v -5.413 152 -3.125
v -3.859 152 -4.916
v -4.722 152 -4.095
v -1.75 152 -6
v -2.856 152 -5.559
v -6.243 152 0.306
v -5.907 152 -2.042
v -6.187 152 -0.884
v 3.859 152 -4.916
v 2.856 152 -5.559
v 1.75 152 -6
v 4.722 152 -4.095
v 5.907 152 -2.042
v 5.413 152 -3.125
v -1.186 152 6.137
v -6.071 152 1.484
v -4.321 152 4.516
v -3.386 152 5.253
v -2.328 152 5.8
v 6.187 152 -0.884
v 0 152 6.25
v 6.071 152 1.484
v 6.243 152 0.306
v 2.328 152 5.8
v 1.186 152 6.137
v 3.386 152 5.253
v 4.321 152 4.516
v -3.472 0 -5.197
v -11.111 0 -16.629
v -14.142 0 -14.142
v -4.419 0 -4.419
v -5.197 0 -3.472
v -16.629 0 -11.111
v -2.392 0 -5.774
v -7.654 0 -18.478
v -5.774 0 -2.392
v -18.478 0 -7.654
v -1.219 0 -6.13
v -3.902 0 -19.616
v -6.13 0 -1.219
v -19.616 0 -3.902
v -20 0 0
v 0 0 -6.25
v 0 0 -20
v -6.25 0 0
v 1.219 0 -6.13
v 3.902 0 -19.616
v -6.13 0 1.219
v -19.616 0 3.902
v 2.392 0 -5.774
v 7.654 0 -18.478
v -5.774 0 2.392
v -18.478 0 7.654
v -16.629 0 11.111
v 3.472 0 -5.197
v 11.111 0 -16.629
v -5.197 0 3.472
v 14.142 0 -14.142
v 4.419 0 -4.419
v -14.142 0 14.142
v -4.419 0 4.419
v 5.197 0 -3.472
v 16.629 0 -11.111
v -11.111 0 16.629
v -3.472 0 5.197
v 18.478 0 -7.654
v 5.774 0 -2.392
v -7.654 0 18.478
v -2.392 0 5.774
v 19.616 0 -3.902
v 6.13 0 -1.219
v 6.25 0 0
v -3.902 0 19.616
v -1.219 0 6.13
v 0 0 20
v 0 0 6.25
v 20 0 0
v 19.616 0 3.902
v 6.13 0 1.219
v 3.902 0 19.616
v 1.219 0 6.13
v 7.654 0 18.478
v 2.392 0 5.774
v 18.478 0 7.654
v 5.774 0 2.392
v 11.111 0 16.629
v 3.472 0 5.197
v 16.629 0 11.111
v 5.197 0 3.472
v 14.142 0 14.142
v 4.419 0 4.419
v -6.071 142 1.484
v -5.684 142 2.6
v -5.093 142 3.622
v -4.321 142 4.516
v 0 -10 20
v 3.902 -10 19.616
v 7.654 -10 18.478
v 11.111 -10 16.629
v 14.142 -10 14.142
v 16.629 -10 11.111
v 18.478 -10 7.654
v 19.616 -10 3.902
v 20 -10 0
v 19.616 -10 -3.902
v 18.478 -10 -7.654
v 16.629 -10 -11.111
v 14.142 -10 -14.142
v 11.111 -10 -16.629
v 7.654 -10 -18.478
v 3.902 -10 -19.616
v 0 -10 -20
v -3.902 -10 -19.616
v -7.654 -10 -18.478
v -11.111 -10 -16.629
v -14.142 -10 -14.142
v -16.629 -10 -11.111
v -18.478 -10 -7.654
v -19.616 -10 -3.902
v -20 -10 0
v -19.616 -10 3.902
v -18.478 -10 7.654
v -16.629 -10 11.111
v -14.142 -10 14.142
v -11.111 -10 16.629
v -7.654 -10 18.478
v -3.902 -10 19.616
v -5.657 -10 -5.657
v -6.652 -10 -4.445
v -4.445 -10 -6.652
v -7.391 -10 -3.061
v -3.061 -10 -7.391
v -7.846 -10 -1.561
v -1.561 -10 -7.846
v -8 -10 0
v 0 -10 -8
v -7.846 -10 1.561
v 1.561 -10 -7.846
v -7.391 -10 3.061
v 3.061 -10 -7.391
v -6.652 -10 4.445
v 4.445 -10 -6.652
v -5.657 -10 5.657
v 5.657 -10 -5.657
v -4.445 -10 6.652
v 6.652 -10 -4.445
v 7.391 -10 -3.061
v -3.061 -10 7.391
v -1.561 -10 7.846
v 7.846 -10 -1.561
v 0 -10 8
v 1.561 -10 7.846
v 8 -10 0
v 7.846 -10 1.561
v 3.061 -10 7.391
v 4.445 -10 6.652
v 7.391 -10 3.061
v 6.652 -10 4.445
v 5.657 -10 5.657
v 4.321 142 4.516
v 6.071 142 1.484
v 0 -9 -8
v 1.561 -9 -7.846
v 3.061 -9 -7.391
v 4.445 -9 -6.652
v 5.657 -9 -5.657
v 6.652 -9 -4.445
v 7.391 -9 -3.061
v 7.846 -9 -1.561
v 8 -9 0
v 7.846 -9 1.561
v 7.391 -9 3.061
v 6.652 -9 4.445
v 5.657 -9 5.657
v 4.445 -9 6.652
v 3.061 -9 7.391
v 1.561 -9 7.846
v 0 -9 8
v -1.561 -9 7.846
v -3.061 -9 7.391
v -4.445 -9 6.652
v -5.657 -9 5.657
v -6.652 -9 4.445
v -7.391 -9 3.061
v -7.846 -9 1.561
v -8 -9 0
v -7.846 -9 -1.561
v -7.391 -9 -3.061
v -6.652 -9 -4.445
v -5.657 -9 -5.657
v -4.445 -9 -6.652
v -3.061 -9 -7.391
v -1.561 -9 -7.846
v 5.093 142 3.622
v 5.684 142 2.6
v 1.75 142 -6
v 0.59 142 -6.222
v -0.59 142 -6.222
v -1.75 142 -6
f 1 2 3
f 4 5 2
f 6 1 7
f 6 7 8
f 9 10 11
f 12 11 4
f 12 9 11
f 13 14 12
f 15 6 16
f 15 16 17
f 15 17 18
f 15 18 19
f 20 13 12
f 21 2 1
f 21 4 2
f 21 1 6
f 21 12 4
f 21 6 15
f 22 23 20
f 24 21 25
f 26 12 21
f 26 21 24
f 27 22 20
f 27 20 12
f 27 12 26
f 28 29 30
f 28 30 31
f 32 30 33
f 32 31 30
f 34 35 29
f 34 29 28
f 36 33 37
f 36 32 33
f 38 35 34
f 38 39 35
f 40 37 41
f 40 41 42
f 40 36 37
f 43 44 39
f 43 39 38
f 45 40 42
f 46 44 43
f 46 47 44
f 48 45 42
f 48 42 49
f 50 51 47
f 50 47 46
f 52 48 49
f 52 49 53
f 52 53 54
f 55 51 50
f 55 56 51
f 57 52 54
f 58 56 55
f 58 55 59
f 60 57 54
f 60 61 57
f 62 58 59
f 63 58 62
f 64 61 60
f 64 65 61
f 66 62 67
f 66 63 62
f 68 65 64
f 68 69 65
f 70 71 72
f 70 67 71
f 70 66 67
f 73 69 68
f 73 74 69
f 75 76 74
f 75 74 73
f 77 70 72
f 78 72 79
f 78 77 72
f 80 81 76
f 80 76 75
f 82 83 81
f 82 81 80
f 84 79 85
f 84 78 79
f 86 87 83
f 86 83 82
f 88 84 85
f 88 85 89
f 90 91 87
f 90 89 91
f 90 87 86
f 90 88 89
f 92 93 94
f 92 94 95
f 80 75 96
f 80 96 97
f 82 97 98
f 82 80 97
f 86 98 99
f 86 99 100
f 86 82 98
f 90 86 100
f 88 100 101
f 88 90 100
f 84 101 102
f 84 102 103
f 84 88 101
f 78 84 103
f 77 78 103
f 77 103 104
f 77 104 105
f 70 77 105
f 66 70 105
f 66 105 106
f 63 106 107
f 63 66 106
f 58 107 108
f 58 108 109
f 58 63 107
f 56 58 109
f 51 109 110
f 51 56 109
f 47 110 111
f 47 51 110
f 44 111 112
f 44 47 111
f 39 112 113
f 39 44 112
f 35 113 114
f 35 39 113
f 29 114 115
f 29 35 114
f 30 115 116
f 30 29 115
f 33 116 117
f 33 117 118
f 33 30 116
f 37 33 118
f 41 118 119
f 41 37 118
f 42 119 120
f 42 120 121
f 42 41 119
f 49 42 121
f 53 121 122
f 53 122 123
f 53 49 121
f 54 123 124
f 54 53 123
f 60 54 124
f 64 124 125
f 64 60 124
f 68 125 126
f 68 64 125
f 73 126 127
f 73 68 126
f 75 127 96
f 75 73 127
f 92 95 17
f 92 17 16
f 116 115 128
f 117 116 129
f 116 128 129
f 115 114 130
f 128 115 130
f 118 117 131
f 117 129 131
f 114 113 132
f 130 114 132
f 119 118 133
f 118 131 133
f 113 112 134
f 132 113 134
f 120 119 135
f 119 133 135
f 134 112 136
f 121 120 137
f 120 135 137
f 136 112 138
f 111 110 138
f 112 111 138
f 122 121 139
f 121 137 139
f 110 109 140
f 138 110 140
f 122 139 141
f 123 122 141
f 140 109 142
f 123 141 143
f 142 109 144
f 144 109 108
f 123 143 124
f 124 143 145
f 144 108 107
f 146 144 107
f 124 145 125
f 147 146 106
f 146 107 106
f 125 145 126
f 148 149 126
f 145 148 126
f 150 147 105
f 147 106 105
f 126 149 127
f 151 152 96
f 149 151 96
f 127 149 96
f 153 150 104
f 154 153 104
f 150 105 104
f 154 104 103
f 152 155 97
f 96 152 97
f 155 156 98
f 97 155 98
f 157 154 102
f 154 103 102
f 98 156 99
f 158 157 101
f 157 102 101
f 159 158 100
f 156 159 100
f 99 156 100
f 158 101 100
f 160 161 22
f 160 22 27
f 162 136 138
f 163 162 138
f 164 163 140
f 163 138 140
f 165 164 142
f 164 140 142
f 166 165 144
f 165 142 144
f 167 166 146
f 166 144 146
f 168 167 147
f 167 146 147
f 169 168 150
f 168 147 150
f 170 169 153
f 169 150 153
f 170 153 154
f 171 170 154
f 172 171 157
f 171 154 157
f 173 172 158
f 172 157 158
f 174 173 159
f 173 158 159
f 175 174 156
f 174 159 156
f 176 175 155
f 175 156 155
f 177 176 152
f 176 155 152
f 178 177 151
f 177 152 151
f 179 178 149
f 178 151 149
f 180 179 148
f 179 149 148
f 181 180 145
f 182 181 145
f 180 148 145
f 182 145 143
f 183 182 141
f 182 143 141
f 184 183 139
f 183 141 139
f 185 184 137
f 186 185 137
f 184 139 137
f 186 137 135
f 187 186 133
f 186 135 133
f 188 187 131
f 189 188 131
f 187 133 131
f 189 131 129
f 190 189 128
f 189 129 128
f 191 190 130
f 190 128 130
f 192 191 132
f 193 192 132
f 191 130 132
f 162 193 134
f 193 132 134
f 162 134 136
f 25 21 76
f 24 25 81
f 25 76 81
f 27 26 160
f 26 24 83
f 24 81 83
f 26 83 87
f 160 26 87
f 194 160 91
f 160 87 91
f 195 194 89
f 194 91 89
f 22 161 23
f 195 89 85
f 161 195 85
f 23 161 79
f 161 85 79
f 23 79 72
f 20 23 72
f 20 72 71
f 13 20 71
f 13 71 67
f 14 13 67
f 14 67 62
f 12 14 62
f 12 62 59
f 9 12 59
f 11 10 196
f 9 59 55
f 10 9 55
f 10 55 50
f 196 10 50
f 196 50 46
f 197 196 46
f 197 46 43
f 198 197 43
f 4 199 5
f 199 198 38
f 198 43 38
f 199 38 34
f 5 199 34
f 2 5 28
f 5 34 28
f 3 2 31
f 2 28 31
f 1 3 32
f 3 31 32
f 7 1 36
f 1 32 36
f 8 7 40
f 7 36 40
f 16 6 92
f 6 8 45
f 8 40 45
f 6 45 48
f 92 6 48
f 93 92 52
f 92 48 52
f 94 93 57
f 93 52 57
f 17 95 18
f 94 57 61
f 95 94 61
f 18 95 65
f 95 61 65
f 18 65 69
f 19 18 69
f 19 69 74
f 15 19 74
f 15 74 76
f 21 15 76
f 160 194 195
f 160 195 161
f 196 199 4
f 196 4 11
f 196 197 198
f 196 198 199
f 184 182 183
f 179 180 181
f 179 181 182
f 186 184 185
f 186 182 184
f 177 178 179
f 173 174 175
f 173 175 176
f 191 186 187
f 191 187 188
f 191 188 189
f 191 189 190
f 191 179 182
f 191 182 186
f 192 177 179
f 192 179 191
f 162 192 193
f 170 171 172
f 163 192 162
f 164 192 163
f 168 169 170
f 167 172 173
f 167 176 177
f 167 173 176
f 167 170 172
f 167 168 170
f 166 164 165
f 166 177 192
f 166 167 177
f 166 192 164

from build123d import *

# Parameters (mm, degrees)
SKETCH1_R           = 20
BOSS_EXTRUDE1_DEPTH = 10
SKETCH2_R           = 6.25
BOSS_EXTRUDE2_DEPTH = 152
CUT_EXTRUDE2_START  = -10
CUT_EXTRUDE2_DEPTH  = 10
CIRPATTERN1_COUNT   = 3
SKETCH8_R           = 8
CUT_EXTRUDE3_DEPTH  = 1


with BuildPart() as part:
    # Sketch1 → Boss-Extrude1 (new body)
    with BuildSketch(Plane(origin=(0, 0, 0), x_dir=(1, 0, 0), z_dir=(0, 1, 0))):
        with Locations(Location((0, 0, 0), (0, 0, 270))):
            Circle(SKETCH1_R)
    extrude(amount=-BOSS_EXTRUDE1_DEPTH)

    # Sketch2 → Boss-Extrude2 (add)
    with BuildSketch(Plane(origin=(0, 0, 0), x_dir=(1, 0, 0), z_dir=(0, 1, 0))):
        with Locations(Location((0, 0, 0), (0, 0, 270))):
            Circle(SKETCH2_R)
    extrude(amount=BOSS_EXTRUDE2_DEPTH)

    # Sketch7 → Cut-Extrude2 (cut)
    with BuildSketch(Plane(origin=(0, 152, 0), x_dir=(1, 0, 0), z_dir=(0, 1, 0)).offset(CUT_EXTRUDE2_START)):
        with BuildLine():
            Line((-1.75, 6), (1.75, 6))
            ThreePointArc((1.75, 6), (0, 6.25), (-1.75, 6))
        make_face()
    cut_extrude2 = extrude(amount=CUT_EXTRUDE2_DEPTH, mode=Mode.SUBTRACT)

    # CirPattern1: Cut-Extrude2 ×3 about axis
    cirpattern1_axis = Axis((0, 0, 0), (0, 1, 0))
    for i in range(1, CIRPATTERN1_COUNT):
        add(cut_extrude2.rotate(cirpattern1_axis, i * 360 / CIRPATTERN1_COUNT), mode=Mode.SUBTRACT)

    # Sketch8 → Cut-Extrude3 (cut)
    with BuildSketch(Plane.XZ.offset(10)):
        with Locations(Location((0, 0, 0), (0, 0, 270))):
            Circle(SKETCH8_R)
    extrude(amount=-CUT_EXTRUDE3_DEPTH, mode=Mode.SUBTRACT)


solid = part.part
